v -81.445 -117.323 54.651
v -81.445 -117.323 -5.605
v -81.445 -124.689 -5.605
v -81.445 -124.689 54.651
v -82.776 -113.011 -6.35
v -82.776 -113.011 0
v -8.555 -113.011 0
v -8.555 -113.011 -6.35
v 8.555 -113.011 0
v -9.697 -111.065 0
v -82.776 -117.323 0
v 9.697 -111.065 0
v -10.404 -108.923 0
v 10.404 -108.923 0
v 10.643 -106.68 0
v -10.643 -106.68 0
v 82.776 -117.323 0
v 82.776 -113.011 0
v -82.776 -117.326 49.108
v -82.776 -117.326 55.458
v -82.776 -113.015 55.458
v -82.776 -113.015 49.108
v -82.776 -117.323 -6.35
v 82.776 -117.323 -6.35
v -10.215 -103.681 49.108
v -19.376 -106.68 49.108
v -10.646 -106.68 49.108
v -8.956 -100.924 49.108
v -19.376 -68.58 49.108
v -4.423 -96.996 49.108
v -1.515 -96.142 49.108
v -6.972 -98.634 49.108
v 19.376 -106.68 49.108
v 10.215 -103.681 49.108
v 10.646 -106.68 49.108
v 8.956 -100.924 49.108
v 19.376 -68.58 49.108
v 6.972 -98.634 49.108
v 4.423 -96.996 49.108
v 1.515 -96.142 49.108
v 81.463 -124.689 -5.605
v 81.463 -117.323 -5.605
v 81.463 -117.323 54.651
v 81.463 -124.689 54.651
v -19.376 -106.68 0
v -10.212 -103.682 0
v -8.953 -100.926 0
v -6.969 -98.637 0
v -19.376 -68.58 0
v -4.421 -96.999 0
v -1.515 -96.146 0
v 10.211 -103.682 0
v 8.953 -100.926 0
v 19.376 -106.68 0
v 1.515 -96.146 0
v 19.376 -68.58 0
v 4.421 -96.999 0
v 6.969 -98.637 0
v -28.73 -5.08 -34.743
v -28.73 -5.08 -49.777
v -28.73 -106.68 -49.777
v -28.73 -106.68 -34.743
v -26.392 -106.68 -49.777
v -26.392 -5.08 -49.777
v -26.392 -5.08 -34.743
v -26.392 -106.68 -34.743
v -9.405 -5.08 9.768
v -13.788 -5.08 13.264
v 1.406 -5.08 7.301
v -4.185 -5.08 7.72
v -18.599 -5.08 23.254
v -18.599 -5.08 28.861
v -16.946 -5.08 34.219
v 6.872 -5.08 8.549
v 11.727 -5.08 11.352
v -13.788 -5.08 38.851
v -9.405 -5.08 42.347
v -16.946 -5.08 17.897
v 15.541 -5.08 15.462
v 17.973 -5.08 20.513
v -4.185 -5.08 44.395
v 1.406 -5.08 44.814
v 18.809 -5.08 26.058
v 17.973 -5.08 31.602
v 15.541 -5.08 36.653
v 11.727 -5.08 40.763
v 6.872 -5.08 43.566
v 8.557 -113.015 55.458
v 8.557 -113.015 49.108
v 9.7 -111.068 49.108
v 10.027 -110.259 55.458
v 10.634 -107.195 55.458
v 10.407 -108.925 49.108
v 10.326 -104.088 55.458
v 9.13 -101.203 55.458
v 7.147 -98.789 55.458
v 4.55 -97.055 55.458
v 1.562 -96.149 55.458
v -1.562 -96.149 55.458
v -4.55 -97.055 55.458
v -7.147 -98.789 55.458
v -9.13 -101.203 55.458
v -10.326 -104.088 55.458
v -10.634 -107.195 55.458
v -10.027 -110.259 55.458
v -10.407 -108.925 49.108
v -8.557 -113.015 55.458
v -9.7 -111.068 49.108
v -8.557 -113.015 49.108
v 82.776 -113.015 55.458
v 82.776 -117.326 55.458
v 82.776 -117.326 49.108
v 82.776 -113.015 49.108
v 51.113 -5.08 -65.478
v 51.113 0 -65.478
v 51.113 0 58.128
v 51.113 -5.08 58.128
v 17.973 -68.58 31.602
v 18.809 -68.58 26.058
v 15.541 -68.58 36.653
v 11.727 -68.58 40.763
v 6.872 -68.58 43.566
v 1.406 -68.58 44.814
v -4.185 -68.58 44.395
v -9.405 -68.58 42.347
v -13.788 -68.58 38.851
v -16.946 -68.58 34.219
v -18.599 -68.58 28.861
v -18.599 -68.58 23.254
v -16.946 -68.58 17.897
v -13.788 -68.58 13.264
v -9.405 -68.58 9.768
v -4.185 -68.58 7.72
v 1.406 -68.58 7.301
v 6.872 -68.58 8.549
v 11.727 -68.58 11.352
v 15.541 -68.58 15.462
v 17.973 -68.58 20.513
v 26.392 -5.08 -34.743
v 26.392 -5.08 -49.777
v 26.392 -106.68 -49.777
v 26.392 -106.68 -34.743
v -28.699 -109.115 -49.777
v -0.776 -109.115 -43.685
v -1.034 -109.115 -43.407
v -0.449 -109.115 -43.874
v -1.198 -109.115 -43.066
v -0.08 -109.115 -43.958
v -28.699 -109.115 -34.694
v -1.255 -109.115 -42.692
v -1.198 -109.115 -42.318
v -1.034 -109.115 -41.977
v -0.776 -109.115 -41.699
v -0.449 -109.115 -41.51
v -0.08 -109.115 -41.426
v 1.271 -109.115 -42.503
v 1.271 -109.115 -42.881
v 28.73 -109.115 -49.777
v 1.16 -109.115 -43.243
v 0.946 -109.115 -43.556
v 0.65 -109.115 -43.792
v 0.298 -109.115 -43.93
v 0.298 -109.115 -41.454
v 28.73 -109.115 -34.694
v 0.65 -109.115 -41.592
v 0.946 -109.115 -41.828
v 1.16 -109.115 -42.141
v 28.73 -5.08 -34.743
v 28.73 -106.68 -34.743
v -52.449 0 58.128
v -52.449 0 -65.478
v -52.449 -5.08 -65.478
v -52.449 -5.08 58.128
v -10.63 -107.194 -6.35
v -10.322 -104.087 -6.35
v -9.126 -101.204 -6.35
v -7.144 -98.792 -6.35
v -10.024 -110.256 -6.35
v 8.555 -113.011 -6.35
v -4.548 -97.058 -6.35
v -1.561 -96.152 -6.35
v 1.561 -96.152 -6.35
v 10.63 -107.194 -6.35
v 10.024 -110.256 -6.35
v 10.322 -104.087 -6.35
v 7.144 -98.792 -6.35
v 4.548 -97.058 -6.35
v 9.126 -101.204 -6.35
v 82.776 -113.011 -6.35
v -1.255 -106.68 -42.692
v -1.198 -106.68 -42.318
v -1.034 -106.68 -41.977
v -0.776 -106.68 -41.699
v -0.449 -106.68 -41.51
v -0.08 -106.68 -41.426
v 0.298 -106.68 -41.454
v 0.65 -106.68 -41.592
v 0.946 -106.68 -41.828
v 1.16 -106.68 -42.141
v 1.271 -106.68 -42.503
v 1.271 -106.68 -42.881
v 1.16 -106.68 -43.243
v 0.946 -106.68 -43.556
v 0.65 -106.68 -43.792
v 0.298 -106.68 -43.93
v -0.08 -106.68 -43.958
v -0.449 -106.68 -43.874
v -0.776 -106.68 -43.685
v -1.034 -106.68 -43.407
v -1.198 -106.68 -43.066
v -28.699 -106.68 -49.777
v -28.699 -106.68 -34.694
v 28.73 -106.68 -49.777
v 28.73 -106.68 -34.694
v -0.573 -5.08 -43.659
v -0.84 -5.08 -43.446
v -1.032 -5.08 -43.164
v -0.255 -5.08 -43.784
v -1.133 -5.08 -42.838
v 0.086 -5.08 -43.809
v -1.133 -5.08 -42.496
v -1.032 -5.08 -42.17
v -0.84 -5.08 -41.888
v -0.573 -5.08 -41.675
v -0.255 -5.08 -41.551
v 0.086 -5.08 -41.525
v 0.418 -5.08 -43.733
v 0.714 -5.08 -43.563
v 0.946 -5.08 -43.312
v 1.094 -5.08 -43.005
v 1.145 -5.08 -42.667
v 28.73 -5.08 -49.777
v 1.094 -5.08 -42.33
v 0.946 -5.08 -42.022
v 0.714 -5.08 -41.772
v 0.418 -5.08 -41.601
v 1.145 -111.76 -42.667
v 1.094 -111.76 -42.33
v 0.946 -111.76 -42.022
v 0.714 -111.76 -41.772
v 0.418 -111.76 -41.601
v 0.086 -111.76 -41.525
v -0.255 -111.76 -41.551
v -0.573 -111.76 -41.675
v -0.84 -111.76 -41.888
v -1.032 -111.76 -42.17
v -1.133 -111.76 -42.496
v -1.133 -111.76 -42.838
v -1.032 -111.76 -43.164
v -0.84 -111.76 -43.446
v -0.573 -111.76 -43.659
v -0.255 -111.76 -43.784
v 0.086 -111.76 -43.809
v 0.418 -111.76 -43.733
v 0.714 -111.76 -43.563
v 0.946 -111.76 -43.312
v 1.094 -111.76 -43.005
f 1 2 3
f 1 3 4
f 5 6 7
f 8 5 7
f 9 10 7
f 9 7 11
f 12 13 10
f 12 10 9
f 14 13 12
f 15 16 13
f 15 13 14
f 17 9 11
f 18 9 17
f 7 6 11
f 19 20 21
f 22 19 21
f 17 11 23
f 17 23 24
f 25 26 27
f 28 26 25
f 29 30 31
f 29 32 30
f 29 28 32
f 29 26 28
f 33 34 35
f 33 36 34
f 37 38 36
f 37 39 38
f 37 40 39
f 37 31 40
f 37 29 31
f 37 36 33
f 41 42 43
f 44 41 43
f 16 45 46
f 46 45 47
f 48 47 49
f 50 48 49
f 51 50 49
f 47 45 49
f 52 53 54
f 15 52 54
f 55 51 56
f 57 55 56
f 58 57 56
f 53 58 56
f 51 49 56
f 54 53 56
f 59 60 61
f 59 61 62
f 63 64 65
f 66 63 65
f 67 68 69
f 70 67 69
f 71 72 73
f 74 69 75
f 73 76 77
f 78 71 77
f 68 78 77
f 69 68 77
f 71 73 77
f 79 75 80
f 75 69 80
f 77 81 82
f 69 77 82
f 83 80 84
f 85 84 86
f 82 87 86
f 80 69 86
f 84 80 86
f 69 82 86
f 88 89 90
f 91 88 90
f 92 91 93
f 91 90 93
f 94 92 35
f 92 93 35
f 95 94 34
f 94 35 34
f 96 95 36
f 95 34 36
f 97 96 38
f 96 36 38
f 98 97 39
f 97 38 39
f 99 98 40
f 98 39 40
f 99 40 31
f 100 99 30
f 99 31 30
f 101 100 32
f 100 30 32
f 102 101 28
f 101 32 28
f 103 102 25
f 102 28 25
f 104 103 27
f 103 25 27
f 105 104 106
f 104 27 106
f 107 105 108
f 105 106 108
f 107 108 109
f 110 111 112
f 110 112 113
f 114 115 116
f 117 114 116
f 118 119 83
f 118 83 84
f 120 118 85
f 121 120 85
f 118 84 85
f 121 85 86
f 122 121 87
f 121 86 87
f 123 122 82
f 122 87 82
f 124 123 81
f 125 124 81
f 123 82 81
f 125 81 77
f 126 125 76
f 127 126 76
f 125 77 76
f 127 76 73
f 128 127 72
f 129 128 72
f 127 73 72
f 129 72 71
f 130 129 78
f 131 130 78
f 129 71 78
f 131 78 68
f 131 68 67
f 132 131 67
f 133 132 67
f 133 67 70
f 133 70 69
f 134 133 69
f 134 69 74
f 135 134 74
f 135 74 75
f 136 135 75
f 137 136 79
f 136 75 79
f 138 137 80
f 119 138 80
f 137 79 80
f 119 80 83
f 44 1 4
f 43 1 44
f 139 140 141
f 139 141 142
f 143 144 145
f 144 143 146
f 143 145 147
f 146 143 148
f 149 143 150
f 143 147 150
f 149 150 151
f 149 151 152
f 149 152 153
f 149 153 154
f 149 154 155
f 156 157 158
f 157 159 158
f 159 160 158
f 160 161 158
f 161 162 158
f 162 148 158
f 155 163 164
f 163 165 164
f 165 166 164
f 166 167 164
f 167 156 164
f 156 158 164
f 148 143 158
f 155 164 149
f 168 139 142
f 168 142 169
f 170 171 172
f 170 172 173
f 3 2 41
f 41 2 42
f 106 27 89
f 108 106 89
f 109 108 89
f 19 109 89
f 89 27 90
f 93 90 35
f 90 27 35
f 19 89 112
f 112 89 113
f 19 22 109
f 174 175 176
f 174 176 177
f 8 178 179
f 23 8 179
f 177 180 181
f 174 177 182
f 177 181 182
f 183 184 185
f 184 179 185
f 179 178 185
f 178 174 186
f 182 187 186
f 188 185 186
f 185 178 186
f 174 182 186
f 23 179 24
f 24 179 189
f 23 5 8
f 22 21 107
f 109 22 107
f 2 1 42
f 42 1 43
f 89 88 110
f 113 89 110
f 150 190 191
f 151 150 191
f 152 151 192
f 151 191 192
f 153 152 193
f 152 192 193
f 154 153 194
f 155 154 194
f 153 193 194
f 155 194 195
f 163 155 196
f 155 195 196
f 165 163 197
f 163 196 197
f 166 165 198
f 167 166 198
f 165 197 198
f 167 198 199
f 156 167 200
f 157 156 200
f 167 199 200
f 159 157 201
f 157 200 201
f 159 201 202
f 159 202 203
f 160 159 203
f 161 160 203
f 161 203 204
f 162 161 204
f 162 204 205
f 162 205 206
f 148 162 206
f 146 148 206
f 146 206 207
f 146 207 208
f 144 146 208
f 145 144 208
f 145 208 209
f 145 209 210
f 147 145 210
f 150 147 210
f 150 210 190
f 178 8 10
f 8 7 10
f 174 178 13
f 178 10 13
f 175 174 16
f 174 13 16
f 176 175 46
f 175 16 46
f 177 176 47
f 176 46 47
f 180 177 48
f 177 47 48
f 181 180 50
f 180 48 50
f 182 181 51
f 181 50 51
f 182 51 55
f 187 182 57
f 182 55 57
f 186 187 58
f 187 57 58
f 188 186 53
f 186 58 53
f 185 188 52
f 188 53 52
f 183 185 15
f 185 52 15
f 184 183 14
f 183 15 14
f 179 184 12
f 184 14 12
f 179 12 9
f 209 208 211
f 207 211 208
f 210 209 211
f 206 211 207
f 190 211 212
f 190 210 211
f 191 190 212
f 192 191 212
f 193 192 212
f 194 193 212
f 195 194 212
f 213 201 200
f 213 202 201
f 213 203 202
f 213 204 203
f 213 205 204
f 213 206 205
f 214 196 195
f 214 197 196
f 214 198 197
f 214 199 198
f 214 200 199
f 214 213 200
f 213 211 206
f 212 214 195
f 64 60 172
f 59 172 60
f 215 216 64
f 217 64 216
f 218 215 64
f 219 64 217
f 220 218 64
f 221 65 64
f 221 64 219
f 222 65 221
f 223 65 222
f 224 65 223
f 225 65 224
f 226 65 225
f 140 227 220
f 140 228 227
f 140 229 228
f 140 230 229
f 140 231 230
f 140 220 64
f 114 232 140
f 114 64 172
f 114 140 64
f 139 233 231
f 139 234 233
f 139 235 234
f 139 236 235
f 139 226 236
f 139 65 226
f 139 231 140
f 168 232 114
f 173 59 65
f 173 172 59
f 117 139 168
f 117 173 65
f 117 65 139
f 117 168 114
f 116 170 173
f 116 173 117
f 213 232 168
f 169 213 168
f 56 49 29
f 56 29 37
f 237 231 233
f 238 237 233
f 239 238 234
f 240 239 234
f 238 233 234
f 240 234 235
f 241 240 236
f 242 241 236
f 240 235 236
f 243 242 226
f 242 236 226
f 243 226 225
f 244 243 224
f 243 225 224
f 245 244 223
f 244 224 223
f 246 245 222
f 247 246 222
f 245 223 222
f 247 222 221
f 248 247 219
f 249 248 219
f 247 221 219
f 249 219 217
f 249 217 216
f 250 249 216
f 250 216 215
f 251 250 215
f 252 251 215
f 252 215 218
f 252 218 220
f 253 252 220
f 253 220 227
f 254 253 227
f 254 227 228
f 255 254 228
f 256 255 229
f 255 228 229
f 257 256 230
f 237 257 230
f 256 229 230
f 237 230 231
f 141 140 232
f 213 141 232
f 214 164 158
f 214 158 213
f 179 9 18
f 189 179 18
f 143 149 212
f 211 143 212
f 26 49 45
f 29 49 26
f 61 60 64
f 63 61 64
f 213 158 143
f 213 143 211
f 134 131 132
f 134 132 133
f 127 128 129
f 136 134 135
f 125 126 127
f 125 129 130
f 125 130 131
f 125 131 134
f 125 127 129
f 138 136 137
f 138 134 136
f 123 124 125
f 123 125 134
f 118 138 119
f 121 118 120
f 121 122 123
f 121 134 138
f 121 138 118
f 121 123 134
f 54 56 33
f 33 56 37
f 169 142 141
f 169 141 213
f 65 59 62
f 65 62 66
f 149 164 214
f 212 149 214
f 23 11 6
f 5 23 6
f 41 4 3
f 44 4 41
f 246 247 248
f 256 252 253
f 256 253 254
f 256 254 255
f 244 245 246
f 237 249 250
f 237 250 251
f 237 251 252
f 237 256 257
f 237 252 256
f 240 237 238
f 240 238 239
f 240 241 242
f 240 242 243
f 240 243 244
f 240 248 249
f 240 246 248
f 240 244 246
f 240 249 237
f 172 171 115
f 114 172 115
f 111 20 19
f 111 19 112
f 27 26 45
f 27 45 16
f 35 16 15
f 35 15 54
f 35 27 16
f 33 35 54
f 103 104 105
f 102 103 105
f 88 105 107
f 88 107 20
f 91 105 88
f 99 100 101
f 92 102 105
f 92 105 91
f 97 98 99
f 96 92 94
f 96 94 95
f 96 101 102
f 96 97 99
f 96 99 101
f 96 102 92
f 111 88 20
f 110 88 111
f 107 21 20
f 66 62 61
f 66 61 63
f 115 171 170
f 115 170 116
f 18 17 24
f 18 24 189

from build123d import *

# Parameters (mm, degrees)
F0_W      = 103.5620048642
F0_H      = 123.6062645912
F1_DEPTH  = 5.08
F2_R      = 18.8091173836
F3_DEPTH  = 63.5
F4_W      = 38.7522298843
F4_H      = 49.1084344685
F5_DEPTH  = 38.1
F6_W      = 2.3384951055
F6_H      = 15.0331929326
F7_DEPTH  = 101.6
F8_W      = 2.4352195215
F8_H      = 15.0823108852
F9_DEPTH  = 57.4294
F11_D     = 2.54
F13_DEPTH = 6.35
F15_DEPTH = 6.35
F16_W     = 165.5515879393
F16_H     = 4.3119760611
F17_DEPTH = 6.35
F18_W     = 165.5515879393
F18_H     = 4.3119760611
F19_DEPTH = 6.35
F20_W     = 162.9079505801
F20_H     = 60.2563126013
F21_DEPTH = 7.366
F22_R     = 1.1452971847
F23_DEPTH = 106.68


with BuildPart() as f1:
    # F0 (on Front) → F1 (new body)
    with BuildSketch(Plane.XZ):
        with Locations((-0.6681419909, -3.6747828126)):
            Rectangle(F0_W, F0_H)
    extrude(amount=F1_DEPTH)

    # F6 (on face) → F7 (join)
    with BuildSketch(Plane.XZ.offset(5.08)):
        with Locations((-27.5608561933, -42.2599799931)):
            Rectangle(F6_W, F6_H)
        with Locations((27.5608561933, -42.2599799931)):
            Rectangle(F6_W, F6_H)
    extrude(amount=F7_DEPTH)

    # F22 (on face) → F23 (join)
    with BuildSketch(Plane.XZ.offset(5.08)):
        with Locations((0, -42.667184025)):
            Circle(F22_R)
    extrude(amount=F23_DEPTH)


with BuildPart() as f3:
    # F2 (on face) → F3 (new body)
    with BuildSketch(Plane.XZ.offset(5.08)):
        with Locations((0, 26.0575376451)):
            Circle(F2_R)
    extrude(amount=F3_DEPTH)


with BuildPart() as f5:
    # F4 (on face) → F5 (new body)
    with BuildSketch(Plane.XZ.offset(68.58)):
        with Locations((-9.313e-07, 24.5542172343)):
            Rectangle(F4_W, F4_H)
    extrude(amount=F5_DEPTH)

    # F12 (on face) → F13 (join)
    with BuildSketch(Plane.XY.offset(49.1084344685)):
        with BuildLine():
            Line((-10.6464871968, -106.68), (10.6464853342, -106.68))
            ThreePointArc((10.6464853342, -106.68), (-9.313e-07, -96.0335137345), (-10.6464871968, -106.68))
        make_face()
        with BuildLine():
            ThreePointArc((-10.6464871968, -106.68), (-9.313e-07, -117.3264862655), (10.6464853342, -106.68))
            Line((10.6464853342, -106.68), (-10.6464871968, -106.68))
        make_face()
    extrude(amount=F13_DEPTH)

    # F14 (on face) → F15 (join)
    with BuildSketch(Plane(origin=(0, 0, 0), x_dir=(1, 0, 0), z_dir=(0, 0, -1))):
        with BuildLine():
            ThreePointArc((-10.6426009313, 106.68), (-9.313e-07, 96.0374), (10.6425990687, 106.68))
            Line((10.6425990687, 106.68), (-10.6426009313, 106.68))
        make_face()
        with BuildLine():
            Line((-10.6426009313, 106.68), (10.6425990687, 106.68))
            ThreePointArc((10.6425990687, 106.68), (-9.313e-07, 117.3226), (-10.6426009313, 106.68))
        make_face()
    extrude(amount=F15_DEPTH)

    # F16 (on face) → F17 (join)
    with BuildSketch(Plane.XY):
        with Locations((0, -115.1666119695)):
            Rectangle(F16_W, F16_H)
    extrude(amount=-F17_DEPTH)

    # F18 (on face) → F19 (join)
    with BuildSketch(Plane.XY.offset(55.4584344685)):
        with Locations((9.313e-07, -115.170498235)):
            Rectangle(F18_W, F18_H)
    extrude(amount=-F19_DEPTH)


with BuildPart() as f9:
    # F8 (on face) → F9 (new body)
    with BuildSketch(Plane.YZ.offset(28.7301037461)):
        with Locations((-107.8976097608, -42.2354210168)):
            Rectangle(F8_W, F8_H)
    extrude(amount=-F9_DEPTH)

    # F11 (through all)
    with Locations(Plane.XZ.offset(109.1152195215)):
        with Locations((0.0154037461, -42.6920428872)):
            Hole(F11_D / 2)


with BuildPart() as f21:
    # F20 (on face) → F21 (new body)
    with BuildSketch(Plane.XZ.offset(117.3226)):
        with Locations((0.0087954104, 24.5229438879)):
            Rectangle(F20_W, F20_H)
    extrude(amount=F21_DEPTH)


solid = Compound([f1.part, f3.part, f5.part, f9.part, f21.part])
